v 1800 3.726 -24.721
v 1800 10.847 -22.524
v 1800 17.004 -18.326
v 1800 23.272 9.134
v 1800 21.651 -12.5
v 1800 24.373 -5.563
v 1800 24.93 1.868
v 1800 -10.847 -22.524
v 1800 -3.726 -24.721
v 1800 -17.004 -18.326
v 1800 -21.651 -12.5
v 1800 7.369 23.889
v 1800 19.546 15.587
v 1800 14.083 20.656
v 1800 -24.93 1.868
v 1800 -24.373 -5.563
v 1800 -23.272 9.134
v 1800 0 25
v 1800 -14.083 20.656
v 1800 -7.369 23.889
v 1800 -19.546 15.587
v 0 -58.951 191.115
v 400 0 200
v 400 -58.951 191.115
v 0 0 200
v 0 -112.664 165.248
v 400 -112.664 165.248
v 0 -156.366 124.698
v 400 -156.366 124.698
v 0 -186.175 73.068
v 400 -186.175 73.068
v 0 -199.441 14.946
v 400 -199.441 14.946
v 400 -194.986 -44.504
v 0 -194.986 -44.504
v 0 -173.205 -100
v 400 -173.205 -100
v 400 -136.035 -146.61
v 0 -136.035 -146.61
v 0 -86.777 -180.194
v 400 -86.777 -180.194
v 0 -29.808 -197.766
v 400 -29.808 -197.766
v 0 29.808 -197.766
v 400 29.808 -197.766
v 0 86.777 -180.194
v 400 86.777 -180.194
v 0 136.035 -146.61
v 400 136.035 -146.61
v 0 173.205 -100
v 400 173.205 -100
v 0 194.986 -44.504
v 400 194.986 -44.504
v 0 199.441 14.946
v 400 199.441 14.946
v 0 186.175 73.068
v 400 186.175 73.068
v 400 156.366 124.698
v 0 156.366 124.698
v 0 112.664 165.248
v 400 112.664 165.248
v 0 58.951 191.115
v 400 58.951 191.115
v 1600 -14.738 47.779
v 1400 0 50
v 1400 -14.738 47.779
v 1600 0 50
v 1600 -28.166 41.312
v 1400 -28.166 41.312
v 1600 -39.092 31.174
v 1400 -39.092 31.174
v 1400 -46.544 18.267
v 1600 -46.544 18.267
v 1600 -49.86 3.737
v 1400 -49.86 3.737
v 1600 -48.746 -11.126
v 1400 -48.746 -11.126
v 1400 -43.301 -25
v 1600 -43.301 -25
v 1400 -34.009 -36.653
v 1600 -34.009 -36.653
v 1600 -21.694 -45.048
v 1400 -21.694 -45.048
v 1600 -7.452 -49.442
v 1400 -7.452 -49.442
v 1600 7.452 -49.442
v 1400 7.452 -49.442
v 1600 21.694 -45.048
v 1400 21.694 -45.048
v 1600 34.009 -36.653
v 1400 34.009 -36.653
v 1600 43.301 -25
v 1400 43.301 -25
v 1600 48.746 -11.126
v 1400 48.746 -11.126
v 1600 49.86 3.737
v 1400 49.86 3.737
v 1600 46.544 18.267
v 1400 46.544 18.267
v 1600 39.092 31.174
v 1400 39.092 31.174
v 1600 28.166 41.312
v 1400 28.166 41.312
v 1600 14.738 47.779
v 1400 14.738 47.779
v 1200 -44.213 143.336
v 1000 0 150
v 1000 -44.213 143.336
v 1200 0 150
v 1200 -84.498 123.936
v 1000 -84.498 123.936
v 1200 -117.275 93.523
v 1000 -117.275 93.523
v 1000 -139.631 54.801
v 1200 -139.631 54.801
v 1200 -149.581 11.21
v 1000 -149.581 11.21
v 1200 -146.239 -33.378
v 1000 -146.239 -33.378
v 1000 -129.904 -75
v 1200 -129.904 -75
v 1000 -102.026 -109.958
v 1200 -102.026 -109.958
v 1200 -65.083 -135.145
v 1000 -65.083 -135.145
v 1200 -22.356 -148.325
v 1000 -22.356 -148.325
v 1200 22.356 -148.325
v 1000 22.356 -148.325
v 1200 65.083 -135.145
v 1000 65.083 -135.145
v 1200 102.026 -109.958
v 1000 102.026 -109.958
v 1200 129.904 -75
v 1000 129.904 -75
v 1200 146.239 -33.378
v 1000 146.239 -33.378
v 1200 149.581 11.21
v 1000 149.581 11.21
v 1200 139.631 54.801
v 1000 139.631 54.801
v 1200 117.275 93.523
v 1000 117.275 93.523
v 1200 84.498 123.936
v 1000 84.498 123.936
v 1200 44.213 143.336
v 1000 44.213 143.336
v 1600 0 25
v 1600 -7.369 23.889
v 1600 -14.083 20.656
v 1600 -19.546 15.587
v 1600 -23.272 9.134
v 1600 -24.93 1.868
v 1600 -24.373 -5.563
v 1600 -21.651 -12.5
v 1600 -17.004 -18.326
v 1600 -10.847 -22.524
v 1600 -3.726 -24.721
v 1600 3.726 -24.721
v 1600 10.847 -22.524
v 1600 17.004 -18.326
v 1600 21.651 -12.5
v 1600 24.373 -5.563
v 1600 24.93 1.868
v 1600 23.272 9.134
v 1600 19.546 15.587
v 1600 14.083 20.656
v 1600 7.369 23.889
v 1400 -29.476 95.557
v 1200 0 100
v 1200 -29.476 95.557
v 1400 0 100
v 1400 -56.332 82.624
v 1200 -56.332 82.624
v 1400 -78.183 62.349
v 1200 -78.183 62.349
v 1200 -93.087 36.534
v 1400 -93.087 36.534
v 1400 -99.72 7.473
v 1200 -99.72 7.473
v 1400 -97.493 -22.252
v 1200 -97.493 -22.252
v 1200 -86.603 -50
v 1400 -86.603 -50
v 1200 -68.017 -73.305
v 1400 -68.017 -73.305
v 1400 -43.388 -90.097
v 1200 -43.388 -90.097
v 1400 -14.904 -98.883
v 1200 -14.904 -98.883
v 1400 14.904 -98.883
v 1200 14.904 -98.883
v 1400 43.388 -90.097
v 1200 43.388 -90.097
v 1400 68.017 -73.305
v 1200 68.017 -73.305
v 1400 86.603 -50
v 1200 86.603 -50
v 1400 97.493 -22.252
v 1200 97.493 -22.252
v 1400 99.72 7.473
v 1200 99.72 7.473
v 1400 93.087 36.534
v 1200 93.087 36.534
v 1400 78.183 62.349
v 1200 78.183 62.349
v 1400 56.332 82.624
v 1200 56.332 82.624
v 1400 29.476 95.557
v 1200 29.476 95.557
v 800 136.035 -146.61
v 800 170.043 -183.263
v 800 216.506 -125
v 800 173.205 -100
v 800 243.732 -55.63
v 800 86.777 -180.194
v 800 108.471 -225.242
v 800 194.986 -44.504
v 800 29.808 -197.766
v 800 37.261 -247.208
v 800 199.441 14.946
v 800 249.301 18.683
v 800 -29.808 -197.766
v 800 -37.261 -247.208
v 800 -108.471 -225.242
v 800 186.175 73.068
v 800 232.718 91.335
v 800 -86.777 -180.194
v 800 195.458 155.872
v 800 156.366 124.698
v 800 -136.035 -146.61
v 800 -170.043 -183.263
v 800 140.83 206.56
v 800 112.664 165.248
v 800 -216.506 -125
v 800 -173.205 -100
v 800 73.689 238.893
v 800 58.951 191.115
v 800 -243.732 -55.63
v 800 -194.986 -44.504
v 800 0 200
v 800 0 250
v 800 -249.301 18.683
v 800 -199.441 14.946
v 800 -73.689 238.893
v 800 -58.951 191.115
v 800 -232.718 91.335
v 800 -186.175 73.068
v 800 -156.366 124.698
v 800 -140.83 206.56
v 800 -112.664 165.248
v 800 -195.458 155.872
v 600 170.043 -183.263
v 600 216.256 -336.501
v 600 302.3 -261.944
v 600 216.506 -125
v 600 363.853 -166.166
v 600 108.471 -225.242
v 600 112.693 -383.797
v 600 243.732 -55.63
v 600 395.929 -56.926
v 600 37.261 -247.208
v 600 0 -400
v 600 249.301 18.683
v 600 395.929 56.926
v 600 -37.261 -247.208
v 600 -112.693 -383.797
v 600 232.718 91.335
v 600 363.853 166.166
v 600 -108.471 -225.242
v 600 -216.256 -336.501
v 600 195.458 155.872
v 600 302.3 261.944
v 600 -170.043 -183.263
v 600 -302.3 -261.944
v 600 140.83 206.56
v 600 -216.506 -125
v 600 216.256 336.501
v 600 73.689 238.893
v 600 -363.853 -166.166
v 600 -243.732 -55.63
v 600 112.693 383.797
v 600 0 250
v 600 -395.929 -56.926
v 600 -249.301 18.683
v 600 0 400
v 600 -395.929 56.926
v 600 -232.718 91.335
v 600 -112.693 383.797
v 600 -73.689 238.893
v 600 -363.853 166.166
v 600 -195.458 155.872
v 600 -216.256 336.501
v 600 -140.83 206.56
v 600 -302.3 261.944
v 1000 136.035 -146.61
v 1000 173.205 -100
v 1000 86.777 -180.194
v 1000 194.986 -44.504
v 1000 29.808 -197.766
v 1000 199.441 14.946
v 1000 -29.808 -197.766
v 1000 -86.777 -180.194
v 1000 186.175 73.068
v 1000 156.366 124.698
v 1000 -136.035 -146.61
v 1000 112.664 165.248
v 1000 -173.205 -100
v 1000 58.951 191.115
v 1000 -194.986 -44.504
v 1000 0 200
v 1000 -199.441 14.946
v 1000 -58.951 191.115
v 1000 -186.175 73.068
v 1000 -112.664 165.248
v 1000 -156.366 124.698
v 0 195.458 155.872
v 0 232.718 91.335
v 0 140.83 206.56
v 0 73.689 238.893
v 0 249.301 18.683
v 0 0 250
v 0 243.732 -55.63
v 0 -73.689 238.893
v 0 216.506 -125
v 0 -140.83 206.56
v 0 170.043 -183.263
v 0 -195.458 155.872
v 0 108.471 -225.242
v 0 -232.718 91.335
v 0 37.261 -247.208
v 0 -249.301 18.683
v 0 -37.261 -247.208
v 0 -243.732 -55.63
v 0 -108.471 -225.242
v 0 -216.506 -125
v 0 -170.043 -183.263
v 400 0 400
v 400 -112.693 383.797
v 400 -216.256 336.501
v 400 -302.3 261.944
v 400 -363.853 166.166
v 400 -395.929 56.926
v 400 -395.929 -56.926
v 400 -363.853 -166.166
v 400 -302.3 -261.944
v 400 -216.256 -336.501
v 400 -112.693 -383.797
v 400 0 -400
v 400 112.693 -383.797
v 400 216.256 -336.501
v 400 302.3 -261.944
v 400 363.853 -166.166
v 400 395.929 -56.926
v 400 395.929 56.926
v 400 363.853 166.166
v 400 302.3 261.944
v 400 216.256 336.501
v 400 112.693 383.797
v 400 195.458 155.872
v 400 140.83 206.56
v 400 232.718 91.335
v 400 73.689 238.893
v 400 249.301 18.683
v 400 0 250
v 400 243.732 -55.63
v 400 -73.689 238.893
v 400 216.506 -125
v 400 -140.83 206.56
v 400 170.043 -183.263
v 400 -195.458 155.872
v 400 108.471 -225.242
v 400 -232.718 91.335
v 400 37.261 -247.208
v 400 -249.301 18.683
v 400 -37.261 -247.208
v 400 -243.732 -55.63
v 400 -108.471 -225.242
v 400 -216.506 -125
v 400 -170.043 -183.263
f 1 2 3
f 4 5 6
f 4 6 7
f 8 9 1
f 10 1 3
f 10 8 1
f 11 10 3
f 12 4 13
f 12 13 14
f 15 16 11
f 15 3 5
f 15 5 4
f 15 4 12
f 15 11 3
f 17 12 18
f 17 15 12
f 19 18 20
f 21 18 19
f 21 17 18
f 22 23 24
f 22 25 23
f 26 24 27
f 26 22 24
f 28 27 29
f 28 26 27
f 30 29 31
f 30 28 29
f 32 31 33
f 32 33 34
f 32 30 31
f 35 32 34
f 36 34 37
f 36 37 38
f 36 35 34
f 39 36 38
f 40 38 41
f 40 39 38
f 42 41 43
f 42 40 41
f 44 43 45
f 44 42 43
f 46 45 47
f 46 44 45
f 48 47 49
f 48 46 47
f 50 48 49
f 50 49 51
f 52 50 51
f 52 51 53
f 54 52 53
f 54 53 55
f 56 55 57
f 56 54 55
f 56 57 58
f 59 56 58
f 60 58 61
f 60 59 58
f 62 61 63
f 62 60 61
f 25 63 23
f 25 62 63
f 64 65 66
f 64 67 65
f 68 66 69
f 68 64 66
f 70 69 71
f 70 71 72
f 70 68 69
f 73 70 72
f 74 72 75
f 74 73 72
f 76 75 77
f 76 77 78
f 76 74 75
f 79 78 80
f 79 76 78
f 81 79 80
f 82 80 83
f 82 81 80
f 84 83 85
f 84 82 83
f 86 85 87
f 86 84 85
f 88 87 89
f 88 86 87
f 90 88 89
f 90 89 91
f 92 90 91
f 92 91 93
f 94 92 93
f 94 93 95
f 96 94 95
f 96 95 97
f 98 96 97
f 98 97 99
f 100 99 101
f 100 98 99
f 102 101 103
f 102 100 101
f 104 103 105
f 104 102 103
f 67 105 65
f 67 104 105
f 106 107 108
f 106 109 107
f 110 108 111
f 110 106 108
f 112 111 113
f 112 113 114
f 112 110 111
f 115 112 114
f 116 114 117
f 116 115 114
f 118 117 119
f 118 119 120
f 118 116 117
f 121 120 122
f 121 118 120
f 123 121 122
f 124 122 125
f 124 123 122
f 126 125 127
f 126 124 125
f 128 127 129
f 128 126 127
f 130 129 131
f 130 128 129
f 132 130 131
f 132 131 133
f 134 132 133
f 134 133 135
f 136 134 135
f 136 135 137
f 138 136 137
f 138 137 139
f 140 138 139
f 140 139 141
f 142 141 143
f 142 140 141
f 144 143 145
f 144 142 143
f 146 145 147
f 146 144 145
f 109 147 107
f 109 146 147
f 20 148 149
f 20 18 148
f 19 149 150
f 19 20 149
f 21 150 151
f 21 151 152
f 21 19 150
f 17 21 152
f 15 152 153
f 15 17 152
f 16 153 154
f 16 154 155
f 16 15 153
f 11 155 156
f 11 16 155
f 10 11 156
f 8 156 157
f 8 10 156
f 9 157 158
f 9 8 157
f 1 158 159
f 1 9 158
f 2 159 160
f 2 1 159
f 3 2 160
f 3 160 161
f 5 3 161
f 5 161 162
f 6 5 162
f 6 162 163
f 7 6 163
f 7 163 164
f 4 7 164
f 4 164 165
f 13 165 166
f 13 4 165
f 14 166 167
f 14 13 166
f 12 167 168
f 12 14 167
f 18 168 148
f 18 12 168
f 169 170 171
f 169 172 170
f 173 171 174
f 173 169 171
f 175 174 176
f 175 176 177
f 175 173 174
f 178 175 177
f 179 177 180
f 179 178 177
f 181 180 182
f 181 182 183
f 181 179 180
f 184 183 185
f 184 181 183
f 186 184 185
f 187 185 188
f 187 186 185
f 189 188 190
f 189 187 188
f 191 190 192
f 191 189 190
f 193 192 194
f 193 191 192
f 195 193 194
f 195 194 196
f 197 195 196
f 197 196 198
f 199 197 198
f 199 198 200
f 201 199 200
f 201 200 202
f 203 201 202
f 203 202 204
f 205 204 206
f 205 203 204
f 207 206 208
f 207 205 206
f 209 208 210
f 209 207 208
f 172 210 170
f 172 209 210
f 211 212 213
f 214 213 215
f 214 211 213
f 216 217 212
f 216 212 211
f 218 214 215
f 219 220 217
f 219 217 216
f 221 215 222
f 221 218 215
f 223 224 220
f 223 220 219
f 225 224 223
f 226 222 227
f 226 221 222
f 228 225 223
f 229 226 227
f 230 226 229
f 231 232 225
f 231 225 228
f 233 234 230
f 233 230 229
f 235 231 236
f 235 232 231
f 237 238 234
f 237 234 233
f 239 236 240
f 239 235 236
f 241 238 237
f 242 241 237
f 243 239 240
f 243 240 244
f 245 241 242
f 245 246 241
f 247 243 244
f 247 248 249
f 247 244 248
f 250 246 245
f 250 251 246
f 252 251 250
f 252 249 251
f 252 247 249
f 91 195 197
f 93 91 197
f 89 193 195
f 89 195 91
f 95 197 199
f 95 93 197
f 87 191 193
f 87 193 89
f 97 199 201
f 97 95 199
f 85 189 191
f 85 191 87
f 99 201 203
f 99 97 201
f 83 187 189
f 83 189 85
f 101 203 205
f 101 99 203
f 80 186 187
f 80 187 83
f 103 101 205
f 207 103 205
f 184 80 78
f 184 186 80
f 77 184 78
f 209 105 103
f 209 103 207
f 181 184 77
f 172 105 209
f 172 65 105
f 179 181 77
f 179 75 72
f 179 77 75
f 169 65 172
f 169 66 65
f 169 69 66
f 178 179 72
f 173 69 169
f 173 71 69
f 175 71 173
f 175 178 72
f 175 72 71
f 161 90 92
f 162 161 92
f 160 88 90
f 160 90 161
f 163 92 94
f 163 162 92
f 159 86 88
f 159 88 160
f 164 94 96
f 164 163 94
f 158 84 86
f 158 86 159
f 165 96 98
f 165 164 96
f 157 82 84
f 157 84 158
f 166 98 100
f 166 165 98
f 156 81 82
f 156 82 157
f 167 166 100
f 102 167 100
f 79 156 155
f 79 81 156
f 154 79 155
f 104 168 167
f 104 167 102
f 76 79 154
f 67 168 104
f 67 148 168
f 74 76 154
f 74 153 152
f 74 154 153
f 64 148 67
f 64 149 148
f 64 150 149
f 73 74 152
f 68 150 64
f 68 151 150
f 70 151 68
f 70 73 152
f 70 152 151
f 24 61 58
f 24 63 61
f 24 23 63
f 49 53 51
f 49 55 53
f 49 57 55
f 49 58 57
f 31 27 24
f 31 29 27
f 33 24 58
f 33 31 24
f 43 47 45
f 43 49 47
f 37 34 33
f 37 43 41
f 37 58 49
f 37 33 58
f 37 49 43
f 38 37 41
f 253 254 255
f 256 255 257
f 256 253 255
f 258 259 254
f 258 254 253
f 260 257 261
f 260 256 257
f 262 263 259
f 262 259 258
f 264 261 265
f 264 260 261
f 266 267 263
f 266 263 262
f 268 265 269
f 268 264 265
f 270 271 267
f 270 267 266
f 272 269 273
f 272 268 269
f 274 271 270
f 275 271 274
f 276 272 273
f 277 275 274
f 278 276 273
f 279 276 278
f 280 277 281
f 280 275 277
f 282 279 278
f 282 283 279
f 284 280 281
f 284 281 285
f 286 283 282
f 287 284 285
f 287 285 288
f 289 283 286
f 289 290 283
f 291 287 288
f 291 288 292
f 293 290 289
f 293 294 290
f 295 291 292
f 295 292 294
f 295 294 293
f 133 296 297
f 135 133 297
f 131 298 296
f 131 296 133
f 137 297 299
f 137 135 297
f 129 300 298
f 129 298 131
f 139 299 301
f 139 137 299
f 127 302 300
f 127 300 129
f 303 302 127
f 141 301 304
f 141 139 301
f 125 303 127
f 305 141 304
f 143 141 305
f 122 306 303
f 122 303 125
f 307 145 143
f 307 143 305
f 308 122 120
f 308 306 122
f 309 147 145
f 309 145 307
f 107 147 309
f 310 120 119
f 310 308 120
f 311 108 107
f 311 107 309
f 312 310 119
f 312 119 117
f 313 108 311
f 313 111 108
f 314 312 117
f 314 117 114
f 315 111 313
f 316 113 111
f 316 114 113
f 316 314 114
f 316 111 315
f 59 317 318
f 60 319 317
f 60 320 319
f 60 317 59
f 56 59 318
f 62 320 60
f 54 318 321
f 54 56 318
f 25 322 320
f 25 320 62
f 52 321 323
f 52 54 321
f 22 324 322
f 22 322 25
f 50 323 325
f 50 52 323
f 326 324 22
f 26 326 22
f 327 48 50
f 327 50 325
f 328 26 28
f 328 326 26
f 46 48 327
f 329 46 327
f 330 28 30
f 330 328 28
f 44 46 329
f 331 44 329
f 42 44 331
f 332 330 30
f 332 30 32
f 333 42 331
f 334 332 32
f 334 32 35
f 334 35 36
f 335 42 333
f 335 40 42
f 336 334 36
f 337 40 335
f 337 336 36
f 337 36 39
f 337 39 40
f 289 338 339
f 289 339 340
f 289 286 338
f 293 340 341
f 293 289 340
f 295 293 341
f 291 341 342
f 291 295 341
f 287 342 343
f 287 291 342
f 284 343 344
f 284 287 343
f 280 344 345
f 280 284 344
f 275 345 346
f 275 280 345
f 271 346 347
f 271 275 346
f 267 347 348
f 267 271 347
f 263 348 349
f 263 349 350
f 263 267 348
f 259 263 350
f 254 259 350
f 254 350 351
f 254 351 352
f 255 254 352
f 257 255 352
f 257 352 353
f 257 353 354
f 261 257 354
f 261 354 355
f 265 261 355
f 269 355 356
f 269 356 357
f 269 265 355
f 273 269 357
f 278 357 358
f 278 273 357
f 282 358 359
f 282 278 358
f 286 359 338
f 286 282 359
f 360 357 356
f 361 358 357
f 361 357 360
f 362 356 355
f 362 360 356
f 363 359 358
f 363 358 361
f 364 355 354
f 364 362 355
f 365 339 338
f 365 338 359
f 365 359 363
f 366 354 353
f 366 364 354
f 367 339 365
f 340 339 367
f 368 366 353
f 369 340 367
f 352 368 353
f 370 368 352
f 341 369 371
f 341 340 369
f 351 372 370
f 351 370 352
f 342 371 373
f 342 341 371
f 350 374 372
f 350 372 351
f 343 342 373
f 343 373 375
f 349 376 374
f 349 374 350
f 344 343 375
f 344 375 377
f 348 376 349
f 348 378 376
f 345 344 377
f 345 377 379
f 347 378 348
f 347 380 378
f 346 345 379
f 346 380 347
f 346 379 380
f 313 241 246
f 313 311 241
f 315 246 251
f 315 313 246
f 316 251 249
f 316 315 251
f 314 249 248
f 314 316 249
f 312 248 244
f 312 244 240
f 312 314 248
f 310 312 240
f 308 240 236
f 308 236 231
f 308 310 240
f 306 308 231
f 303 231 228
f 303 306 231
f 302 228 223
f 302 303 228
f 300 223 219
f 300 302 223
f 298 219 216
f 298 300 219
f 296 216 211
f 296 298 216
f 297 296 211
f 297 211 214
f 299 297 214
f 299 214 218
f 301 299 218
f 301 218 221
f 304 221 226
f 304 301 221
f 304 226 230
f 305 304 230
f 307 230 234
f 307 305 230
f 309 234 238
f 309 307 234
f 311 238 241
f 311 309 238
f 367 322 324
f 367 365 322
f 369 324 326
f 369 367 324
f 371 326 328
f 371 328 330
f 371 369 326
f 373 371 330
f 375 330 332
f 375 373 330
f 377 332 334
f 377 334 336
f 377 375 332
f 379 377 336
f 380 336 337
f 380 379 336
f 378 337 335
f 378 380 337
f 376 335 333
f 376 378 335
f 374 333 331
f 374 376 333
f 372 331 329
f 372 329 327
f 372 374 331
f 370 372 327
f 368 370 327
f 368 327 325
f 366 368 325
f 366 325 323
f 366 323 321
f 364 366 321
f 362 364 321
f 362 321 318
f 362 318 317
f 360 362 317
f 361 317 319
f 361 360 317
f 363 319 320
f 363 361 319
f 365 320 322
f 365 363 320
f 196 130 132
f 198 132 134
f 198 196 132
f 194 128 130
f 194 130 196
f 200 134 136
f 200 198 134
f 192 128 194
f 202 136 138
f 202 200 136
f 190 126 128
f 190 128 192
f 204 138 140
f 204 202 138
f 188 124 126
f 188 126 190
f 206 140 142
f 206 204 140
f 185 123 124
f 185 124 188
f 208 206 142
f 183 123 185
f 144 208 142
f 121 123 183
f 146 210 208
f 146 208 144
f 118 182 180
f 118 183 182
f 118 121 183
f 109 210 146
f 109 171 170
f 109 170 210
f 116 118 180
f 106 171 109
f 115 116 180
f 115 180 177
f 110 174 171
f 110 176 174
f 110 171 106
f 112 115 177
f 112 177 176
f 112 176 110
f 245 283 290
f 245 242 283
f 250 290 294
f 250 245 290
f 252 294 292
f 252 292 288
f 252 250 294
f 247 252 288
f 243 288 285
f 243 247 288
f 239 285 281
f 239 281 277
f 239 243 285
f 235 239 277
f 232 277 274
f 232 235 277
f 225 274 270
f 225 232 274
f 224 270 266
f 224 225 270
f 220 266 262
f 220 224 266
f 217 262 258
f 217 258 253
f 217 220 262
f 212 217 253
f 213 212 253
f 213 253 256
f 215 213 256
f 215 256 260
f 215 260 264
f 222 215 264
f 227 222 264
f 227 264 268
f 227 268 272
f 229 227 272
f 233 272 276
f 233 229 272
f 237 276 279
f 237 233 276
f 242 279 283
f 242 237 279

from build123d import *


with BuildPart() as part:
    # Sketch2 → Revolve6 (revolve)
    with BuildSketch(Plane.XY, mode=Mode.PRIVATE) as revolve6_sk:
        Polygon((1600, 50), (1600, 25), (1800, 25), (1800, 0), (400, 0), (400, 200), (0, 200), (0, 250), (400, 250), (400, 400), (600, 400), (600, 250), (800, 250), (800, 200), (1000, 200), (1000, 150), (1200, 150), (1200, 100), (1400, 100), (1400, 50), align=None)
    revolve(revolve6_sk.sketch.rotate(Axis((0, 0, 0), (1, 0, 0)), 90), axis=Axis((0, 0, 0), (1, 0, 0)))  # turned: the seam where the file's is


solid = part.part
